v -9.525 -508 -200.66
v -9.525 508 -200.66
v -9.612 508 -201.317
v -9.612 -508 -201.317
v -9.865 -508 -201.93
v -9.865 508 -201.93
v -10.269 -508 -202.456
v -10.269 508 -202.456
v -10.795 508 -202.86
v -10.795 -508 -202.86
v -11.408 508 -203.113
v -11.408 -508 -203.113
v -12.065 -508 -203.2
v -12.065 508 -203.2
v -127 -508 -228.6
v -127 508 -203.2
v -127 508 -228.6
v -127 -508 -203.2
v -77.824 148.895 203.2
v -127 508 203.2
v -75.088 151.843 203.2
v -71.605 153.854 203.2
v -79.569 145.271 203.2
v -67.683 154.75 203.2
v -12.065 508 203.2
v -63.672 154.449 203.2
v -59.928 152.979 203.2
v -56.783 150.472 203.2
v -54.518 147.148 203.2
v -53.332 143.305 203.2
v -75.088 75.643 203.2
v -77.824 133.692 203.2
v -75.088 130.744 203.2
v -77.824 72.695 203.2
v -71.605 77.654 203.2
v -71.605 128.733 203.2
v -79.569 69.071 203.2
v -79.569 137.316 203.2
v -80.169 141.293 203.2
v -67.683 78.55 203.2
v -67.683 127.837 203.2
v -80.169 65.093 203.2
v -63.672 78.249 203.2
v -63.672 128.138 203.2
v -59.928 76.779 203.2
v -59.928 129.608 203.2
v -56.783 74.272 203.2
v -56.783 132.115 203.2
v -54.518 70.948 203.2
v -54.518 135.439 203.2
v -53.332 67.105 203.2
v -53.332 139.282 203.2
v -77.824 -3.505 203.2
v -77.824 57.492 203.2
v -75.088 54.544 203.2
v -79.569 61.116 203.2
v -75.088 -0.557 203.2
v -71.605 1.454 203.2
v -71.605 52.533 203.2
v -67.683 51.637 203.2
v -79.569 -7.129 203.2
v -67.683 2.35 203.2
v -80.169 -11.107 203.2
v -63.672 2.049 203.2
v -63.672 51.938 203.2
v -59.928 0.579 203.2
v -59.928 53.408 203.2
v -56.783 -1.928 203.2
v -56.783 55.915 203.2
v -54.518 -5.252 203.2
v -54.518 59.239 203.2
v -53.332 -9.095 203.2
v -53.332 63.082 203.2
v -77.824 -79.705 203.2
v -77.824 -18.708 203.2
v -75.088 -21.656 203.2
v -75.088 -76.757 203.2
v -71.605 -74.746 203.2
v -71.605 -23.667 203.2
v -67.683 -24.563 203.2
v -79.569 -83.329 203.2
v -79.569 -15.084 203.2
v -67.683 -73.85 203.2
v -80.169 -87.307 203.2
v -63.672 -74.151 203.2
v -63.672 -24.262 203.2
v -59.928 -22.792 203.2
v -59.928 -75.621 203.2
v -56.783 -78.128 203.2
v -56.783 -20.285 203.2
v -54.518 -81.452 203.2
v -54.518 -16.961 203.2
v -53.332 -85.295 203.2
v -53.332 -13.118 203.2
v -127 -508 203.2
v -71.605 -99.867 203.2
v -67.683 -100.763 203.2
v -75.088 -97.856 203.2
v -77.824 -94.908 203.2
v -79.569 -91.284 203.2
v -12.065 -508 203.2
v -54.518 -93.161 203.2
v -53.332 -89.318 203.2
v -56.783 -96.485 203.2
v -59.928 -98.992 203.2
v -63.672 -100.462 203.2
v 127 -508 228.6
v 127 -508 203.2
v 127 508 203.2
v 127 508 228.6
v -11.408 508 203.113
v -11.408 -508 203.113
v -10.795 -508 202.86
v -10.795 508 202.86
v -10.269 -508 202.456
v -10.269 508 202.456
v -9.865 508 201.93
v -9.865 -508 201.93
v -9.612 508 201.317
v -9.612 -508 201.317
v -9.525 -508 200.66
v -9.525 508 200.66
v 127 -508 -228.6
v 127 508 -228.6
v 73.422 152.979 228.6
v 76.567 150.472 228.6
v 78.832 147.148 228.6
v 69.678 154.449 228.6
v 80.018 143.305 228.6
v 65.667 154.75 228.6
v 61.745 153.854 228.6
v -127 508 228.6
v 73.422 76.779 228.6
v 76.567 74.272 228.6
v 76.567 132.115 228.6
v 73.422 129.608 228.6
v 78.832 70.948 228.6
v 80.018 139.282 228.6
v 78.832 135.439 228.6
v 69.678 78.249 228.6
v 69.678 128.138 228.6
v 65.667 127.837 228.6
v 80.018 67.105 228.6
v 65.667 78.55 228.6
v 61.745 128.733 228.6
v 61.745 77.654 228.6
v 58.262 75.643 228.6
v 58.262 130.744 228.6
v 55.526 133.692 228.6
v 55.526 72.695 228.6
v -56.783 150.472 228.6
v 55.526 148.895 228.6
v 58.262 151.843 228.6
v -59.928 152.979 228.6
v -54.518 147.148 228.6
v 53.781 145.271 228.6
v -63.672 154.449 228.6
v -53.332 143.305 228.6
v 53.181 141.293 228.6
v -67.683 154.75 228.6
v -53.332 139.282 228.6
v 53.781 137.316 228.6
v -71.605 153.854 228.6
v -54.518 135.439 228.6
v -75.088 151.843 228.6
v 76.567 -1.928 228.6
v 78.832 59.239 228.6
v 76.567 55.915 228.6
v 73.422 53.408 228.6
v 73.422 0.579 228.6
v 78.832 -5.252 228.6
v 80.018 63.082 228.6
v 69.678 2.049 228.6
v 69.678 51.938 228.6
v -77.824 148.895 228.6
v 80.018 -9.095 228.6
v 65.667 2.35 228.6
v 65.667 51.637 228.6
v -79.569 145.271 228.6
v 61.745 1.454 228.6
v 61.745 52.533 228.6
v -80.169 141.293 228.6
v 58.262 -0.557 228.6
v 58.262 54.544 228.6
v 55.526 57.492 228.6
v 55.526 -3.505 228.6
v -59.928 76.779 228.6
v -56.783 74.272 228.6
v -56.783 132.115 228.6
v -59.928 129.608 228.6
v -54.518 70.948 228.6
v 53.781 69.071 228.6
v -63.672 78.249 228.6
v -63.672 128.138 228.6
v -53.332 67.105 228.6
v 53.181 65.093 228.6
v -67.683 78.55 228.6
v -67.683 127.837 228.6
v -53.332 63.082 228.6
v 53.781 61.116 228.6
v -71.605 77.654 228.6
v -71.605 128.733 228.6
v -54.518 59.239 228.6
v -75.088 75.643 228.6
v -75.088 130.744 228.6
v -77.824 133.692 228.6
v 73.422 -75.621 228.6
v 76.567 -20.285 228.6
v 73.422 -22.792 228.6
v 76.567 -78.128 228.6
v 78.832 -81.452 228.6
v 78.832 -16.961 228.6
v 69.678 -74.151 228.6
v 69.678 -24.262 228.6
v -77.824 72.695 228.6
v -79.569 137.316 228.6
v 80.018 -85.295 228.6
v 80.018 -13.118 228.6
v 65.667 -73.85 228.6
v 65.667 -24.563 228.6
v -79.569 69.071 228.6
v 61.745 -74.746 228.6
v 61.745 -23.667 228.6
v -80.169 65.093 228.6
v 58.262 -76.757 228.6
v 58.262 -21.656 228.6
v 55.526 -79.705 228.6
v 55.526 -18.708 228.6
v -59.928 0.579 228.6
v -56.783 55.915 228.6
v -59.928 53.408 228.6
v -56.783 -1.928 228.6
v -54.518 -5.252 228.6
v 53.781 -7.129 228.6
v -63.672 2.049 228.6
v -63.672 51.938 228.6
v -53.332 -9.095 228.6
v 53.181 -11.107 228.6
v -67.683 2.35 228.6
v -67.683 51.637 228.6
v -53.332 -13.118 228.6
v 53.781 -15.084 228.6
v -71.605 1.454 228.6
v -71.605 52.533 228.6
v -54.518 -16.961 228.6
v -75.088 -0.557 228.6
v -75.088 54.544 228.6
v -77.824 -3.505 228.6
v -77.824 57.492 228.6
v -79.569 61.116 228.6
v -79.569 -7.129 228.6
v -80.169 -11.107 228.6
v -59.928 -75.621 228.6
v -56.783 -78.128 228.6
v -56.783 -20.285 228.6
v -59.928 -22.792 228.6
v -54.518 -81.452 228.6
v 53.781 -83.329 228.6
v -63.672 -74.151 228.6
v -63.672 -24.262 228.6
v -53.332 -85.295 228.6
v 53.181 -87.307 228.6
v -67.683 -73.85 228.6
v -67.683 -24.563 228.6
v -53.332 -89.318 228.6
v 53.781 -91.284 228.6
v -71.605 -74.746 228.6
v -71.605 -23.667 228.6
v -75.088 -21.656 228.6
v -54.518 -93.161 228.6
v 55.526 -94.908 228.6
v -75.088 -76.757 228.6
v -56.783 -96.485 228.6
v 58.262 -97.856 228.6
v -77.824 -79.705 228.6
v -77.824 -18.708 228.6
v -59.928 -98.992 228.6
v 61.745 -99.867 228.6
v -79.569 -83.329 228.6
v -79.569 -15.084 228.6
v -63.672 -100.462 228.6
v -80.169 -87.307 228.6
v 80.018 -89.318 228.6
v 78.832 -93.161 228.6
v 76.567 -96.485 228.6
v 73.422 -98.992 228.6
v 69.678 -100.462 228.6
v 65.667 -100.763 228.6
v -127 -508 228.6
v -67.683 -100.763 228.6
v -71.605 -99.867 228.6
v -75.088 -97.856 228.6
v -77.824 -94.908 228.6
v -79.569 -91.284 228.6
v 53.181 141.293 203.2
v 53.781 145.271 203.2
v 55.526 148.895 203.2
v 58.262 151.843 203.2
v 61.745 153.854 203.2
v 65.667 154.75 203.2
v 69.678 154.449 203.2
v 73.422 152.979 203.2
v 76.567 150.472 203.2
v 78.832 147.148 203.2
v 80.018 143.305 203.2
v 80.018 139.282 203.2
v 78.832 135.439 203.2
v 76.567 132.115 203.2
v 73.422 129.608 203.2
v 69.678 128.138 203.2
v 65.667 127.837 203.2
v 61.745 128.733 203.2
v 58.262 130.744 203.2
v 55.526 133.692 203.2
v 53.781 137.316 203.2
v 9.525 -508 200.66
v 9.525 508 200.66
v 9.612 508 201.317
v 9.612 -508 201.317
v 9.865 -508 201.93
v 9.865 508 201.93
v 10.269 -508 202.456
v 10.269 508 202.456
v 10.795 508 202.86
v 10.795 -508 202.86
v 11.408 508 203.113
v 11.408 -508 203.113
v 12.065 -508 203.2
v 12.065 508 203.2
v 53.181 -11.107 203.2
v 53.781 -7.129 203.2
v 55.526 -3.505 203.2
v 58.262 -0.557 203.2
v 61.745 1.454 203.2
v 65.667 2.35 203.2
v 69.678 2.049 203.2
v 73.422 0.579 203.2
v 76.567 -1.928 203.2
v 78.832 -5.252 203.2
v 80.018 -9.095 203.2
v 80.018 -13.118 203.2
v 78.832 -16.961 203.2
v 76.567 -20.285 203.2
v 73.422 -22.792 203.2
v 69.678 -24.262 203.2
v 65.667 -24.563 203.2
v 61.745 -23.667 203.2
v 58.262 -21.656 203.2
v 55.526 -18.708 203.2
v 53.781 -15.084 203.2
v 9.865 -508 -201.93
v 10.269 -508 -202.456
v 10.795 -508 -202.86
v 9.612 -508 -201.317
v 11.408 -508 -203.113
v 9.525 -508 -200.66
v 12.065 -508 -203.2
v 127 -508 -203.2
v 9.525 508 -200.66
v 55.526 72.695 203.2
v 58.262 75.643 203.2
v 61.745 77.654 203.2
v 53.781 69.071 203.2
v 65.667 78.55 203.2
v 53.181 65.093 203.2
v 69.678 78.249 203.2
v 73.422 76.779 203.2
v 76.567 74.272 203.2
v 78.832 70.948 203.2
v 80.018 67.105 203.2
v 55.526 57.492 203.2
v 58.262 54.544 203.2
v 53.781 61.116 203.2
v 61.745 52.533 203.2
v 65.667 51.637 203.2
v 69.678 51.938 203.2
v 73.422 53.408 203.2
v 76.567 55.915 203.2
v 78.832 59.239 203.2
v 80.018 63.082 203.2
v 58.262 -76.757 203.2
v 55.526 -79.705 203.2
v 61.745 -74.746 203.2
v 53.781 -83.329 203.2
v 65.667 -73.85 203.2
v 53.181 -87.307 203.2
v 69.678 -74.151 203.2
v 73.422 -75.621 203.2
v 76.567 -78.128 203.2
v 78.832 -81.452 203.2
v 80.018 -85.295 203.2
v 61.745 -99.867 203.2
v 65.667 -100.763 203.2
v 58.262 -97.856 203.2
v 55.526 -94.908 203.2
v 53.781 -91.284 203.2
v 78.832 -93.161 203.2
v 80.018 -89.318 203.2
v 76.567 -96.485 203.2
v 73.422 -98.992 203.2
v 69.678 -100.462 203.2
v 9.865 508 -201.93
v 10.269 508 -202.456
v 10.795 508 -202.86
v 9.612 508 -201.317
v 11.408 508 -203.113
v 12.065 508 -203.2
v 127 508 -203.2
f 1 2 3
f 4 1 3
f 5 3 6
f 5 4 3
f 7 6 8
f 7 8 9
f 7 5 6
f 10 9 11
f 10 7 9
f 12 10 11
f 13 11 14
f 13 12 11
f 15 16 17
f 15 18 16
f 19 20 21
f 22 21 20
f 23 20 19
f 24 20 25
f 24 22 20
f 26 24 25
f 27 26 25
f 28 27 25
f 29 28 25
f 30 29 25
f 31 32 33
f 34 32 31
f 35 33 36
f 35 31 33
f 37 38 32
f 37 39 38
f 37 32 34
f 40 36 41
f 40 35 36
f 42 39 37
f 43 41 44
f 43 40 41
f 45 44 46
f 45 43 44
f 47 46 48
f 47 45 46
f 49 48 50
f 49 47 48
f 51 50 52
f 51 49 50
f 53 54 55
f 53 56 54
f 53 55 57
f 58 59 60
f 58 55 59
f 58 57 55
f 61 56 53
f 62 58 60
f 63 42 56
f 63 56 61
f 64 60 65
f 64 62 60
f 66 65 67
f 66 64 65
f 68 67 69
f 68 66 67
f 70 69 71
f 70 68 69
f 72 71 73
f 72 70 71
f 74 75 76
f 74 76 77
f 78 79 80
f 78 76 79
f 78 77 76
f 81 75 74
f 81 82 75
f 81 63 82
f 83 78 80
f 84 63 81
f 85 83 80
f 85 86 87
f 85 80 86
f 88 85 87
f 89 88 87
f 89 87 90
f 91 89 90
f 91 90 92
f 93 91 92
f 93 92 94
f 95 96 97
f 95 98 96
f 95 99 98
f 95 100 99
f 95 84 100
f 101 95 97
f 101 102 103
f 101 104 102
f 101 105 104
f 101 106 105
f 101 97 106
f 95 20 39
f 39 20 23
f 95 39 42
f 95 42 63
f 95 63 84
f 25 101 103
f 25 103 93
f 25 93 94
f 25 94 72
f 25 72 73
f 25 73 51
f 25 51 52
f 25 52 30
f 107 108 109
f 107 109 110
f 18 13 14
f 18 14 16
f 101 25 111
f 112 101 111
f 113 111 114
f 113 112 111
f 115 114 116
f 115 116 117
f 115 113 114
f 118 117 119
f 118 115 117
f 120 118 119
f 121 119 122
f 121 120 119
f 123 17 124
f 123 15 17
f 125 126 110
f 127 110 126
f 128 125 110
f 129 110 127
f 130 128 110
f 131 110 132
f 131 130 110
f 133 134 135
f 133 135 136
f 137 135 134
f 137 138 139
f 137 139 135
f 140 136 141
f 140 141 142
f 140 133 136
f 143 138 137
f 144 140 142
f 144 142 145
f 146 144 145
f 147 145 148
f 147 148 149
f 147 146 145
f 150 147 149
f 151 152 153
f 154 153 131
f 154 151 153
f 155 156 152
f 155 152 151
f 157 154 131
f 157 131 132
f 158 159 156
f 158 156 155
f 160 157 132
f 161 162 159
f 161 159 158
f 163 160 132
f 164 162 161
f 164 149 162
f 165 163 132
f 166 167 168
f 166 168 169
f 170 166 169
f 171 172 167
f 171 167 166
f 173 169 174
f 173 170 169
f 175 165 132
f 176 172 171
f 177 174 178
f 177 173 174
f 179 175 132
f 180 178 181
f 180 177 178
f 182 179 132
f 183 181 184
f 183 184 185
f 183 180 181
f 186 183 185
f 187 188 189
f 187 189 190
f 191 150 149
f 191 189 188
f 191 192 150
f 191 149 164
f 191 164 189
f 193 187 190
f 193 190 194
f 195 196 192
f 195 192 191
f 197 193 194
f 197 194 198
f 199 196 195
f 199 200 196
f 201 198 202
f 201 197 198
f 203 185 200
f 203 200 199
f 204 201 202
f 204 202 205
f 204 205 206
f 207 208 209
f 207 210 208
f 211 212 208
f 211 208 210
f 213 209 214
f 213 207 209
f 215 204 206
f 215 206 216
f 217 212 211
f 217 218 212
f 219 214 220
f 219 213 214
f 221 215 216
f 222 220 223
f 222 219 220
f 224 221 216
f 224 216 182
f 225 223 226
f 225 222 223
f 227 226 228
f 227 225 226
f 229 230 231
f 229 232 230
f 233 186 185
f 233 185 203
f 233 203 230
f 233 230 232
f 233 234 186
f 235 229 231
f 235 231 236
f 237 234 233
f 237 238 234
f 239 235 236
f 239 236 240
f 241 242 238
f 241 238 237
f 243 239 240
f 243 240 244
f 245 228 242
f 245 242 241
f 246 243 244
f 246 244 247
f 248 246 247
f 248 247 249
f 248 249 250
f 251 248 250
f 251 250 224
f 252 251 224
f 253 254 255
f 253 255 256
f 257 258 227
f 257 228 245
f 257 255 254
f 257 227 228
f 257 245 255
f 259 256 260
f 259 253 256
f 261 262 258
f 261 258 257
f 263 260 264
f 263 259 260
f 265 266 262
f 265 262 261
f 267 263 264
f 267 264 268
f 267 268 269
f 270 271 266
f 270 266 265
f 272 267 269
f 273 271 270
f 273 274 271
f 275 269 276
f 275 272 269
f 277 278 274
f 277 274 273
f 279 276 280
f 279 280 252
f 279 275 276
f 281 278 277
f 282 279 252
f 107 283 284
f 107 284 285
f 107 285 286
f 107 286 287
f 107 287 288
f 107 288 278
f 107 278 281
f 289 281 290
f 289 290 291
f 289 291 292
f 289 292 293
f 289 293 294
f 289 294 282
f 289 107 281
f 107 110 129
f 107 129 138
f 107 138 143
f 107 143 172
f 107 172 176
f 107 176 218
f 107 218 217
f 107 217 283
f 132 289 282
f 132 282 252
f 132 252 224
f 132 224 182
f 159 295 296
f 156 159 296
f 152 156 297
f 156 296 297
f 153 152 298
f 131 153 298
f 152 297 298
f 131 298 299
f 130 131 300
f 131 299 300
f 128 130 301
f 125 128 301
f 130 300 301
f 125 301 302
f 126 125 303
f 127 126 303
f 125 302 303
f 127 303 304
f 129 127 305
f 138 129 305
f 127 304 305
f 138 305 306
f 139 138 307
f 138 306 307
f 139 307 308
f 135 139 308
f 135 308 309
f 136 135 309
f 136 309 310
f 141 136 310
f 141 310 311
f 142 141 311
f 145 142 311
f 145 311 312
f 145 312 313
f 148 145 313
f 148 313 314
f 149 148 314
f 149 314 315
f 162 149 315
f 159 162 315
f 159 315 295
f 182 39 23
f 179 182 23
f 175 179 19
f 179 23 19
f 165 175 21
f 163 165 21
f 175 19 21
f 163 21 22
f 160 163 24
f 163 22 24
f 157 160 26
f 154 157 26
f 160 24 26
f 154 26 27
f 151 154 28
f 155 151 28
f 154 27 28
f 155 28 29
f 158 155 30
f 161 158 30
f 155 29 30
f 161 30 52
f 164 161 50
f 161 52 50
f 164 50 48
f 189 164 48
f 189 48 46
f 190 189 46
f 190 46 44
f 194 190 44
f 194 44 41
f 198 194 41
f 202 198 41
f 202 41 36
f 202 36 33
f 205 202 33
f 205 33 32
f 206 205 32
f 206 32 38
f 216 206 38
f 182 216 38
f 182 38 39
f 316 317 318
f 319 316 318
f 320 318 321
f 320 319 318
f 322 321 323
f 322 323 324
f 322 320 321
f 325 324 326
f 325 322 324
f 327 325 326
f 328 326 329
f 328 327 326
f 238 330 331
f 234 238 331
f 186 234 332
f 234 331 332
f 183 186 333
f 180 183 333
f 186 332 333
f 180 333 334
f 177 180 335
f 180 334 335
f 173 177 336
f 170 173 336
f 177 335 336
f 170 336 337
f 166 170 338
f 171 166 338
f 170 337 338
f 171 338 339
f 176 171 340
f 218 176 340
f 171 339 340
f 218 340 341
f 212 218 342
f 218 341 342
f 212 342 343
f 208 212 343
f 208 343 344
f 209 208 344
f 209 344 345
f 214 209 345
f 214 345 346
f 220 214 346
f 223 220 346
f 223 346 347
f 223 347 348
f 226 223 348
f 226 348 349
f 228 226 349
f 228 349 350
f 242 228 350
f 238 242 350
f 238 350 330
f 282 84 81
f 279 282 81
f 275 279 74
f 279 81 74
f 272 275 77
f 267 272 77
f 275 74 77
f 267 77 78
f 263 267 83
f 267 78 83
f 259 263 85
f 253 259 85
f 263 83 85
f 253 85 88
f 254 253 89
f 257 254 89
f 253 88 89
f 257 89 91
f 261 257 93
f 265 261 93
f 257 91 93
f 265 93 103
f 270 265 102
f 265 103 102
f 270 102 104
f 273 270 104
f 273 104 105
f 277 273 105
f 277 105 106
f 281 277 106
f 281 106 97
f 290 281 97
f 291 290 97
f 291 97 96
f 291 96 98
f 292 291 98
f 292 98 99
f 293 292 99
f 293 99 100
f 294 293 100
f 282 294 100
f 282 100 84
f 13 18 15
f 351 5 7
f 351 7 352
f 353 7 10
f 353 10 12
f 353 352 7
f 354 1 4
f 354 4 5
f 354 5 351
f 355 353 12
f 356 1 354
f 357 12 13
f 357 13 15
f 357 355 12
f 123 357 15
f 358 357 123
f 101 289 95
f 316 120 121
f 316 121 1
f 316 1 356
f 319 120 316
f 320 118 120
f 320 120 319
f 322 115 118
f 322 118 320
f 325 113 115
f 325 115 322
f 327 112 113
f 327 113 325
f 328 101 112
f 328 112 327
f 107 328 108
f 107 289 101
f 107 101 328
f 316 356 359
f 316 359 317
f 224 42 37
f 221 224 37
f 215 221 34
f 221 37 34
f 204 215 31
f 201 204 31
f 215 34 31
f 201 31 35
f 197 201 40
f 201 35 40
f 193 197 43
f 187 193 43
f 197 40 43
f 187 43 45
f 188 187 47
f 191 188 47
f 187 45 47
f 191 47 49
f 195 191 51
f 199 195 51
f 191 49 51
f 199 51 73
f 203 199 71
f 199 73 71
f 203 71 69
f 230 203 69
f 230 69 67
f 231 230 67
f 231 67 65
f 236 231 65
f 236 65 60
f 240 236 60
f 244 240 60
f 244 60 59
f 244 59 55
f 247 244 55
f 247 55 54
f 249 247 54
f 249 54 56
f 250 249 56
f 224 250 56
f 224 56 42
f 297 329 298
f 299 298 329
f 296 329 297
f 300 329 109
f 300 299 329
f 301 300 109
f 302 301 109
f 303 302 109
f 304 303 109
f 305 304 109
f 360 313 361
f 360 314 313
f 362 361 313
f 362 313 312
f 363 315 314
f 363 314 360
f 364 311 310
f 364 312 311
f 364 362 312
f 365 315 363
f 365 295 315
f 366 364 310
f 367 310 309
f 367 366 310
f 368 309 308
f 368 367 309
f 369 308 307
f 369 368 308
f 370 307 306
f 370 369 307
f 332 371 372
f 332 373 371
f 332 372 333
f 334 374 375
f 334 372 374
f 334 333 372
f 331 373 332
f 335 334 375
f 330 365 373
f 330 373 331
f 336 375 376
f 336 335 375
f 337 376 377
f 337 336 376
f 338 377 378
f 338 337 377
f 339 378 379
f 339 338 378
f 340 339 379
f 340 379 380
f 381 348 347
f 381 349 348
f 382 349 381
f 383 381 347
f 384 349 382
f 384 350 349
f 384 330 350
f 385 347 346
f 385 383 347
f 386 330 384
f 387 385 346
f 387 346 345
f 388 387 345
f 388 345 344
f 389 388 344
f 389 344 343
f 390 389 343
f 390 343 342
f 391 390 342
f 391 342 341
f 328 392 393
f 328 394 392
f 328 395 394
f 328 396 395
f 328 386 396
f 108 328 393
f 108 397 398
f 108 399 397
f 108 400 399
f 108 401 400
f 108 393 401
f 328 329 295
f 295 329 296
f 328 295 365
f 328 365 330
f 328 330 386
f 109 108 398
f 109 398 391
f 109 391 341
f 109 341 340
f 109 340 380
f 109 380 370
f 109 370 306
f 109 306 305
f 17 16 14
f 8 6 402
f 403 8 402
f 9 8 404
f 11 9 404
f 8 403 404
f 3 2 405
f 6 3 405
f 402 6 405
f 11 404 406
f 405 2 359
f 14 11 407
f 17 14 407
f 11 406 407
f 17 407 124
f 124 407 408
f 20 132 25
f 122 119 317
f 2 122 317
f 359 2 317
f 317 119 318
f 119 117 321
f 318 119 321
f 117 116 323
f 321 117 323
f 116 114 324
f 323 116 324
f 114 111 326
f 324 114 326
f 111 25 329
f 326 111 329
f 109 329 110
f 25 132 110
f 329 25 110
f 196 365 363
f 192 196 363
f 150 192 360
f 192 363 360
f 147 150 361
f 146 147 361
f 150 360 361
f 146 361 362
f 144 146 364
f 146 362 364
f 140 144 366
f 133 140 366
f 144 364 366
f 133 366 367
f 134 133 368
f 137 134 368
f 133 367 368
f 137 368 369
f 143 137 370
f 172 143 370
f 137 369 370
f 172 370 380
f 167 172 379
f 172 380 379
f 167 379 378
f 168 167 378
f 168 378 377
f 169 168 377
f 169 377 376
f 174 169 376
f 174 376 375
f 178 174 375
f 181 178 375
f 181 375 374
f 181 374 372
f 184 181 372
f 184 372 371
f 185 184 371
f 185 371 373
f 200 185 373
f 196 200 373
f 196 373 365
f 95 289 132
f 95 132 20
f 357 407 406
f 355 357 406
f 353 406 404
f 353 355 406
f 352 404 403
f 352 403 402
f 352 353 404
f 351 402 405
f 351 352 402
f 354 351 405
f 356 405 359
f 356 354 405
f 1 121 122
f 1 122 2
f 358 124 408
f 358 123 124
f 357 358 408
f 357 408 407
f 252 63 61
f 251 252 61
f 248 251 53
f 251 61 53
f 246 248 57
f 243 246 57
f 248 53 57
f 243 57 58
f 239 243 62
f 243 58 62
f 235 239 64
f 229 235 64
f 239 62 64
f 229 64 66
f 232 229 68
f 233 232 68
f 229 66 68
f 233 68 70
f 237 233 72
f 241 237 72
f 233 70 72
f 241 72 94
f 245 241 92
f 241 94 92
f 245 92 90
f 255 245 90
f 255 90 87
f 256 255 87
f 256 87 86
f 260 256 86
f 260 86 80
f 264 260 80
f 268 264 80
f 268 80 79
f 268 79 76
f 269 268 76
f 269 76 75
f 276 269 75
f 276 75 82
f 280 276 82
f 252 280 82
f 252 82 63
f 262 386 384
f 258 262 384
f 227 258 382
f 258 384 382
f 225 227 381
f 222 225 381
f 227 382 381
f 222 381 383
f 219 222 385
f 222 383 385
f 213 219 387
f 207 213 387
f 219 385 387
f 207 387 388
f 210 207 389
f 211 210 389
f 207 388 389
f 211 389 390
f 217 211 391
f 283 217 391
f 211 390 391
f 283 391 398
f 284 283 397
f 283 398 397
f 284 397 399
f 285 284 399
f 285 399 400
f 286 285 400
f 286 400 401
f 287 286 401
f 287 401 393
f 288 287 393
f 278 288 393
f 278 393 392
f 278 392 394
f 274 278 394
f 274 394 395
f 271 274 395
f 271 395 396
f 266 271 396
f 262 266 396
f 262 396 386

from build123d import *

# Parameters (mm, degrees)
F1_DEPTH = 508
F3_D     = 26.9875
F3_DEPTH = 25.4


with BuildPart() as f1:
    # F0 (on Front) → F1 (new body, symmetric)
    with BuildSketch(Plane.XZ):
        with BuildLine():
            Line((127, -228.6), (127, -203.2))
            Line((127, -203.2), (12.065, -203.2))
            ThreePointArc((12.065, -203.2), (10.268949, -202.456051), (9.525, -200.66))
            Line((9.525, -200.66), (9.525, 200.66))
            ThreePointArc((9.525, 200.66), (10.268949, 202.456051), (12.065, 203.2))
            Line((12.065, 203.2), (127, 203.2))
            Line((127, 203.2), (127, 228.6))
            Line((127, 228.6), (-127, 228.6))
            Line((-127, 228.6), (-127, 203.2))
            Line((-127, 203.2), (-12.065, 203.2))
            ThreePointArc((-12.065, 203.2), (-10.268949, 202.456051), (-9.525, 200.66))
            Line((-9.525, 200.66), (-9.525, -200.66))
            ThreePointArc((-9.525, -200.66), (-10.268949, -202.456051), (-12.065, -203.2))
            Line((-12.065, -203.2), (-127, -203.2))
            Line((-127, -203.2), (-127, -228.6))
            Line((-127, -228.6), (127, -228.6))
        make_face()
    extrude(amount=F1_DEPTH, both=True)

    # F3
    with Locations(Plane.XY.offset(228.6)):
        with Locations((-66.675, 141.293497), (-66.675, 65.093497), (-66.675, -11.106503), (-66.675, -87.306503), (66.675, -87.306503), (66.675, -11.106503), (66.675, 65.093497), (66.675, 141.293497)):
            Hole(F3_D / 2, depth=F3_DEPTH)


solid = f1.part
